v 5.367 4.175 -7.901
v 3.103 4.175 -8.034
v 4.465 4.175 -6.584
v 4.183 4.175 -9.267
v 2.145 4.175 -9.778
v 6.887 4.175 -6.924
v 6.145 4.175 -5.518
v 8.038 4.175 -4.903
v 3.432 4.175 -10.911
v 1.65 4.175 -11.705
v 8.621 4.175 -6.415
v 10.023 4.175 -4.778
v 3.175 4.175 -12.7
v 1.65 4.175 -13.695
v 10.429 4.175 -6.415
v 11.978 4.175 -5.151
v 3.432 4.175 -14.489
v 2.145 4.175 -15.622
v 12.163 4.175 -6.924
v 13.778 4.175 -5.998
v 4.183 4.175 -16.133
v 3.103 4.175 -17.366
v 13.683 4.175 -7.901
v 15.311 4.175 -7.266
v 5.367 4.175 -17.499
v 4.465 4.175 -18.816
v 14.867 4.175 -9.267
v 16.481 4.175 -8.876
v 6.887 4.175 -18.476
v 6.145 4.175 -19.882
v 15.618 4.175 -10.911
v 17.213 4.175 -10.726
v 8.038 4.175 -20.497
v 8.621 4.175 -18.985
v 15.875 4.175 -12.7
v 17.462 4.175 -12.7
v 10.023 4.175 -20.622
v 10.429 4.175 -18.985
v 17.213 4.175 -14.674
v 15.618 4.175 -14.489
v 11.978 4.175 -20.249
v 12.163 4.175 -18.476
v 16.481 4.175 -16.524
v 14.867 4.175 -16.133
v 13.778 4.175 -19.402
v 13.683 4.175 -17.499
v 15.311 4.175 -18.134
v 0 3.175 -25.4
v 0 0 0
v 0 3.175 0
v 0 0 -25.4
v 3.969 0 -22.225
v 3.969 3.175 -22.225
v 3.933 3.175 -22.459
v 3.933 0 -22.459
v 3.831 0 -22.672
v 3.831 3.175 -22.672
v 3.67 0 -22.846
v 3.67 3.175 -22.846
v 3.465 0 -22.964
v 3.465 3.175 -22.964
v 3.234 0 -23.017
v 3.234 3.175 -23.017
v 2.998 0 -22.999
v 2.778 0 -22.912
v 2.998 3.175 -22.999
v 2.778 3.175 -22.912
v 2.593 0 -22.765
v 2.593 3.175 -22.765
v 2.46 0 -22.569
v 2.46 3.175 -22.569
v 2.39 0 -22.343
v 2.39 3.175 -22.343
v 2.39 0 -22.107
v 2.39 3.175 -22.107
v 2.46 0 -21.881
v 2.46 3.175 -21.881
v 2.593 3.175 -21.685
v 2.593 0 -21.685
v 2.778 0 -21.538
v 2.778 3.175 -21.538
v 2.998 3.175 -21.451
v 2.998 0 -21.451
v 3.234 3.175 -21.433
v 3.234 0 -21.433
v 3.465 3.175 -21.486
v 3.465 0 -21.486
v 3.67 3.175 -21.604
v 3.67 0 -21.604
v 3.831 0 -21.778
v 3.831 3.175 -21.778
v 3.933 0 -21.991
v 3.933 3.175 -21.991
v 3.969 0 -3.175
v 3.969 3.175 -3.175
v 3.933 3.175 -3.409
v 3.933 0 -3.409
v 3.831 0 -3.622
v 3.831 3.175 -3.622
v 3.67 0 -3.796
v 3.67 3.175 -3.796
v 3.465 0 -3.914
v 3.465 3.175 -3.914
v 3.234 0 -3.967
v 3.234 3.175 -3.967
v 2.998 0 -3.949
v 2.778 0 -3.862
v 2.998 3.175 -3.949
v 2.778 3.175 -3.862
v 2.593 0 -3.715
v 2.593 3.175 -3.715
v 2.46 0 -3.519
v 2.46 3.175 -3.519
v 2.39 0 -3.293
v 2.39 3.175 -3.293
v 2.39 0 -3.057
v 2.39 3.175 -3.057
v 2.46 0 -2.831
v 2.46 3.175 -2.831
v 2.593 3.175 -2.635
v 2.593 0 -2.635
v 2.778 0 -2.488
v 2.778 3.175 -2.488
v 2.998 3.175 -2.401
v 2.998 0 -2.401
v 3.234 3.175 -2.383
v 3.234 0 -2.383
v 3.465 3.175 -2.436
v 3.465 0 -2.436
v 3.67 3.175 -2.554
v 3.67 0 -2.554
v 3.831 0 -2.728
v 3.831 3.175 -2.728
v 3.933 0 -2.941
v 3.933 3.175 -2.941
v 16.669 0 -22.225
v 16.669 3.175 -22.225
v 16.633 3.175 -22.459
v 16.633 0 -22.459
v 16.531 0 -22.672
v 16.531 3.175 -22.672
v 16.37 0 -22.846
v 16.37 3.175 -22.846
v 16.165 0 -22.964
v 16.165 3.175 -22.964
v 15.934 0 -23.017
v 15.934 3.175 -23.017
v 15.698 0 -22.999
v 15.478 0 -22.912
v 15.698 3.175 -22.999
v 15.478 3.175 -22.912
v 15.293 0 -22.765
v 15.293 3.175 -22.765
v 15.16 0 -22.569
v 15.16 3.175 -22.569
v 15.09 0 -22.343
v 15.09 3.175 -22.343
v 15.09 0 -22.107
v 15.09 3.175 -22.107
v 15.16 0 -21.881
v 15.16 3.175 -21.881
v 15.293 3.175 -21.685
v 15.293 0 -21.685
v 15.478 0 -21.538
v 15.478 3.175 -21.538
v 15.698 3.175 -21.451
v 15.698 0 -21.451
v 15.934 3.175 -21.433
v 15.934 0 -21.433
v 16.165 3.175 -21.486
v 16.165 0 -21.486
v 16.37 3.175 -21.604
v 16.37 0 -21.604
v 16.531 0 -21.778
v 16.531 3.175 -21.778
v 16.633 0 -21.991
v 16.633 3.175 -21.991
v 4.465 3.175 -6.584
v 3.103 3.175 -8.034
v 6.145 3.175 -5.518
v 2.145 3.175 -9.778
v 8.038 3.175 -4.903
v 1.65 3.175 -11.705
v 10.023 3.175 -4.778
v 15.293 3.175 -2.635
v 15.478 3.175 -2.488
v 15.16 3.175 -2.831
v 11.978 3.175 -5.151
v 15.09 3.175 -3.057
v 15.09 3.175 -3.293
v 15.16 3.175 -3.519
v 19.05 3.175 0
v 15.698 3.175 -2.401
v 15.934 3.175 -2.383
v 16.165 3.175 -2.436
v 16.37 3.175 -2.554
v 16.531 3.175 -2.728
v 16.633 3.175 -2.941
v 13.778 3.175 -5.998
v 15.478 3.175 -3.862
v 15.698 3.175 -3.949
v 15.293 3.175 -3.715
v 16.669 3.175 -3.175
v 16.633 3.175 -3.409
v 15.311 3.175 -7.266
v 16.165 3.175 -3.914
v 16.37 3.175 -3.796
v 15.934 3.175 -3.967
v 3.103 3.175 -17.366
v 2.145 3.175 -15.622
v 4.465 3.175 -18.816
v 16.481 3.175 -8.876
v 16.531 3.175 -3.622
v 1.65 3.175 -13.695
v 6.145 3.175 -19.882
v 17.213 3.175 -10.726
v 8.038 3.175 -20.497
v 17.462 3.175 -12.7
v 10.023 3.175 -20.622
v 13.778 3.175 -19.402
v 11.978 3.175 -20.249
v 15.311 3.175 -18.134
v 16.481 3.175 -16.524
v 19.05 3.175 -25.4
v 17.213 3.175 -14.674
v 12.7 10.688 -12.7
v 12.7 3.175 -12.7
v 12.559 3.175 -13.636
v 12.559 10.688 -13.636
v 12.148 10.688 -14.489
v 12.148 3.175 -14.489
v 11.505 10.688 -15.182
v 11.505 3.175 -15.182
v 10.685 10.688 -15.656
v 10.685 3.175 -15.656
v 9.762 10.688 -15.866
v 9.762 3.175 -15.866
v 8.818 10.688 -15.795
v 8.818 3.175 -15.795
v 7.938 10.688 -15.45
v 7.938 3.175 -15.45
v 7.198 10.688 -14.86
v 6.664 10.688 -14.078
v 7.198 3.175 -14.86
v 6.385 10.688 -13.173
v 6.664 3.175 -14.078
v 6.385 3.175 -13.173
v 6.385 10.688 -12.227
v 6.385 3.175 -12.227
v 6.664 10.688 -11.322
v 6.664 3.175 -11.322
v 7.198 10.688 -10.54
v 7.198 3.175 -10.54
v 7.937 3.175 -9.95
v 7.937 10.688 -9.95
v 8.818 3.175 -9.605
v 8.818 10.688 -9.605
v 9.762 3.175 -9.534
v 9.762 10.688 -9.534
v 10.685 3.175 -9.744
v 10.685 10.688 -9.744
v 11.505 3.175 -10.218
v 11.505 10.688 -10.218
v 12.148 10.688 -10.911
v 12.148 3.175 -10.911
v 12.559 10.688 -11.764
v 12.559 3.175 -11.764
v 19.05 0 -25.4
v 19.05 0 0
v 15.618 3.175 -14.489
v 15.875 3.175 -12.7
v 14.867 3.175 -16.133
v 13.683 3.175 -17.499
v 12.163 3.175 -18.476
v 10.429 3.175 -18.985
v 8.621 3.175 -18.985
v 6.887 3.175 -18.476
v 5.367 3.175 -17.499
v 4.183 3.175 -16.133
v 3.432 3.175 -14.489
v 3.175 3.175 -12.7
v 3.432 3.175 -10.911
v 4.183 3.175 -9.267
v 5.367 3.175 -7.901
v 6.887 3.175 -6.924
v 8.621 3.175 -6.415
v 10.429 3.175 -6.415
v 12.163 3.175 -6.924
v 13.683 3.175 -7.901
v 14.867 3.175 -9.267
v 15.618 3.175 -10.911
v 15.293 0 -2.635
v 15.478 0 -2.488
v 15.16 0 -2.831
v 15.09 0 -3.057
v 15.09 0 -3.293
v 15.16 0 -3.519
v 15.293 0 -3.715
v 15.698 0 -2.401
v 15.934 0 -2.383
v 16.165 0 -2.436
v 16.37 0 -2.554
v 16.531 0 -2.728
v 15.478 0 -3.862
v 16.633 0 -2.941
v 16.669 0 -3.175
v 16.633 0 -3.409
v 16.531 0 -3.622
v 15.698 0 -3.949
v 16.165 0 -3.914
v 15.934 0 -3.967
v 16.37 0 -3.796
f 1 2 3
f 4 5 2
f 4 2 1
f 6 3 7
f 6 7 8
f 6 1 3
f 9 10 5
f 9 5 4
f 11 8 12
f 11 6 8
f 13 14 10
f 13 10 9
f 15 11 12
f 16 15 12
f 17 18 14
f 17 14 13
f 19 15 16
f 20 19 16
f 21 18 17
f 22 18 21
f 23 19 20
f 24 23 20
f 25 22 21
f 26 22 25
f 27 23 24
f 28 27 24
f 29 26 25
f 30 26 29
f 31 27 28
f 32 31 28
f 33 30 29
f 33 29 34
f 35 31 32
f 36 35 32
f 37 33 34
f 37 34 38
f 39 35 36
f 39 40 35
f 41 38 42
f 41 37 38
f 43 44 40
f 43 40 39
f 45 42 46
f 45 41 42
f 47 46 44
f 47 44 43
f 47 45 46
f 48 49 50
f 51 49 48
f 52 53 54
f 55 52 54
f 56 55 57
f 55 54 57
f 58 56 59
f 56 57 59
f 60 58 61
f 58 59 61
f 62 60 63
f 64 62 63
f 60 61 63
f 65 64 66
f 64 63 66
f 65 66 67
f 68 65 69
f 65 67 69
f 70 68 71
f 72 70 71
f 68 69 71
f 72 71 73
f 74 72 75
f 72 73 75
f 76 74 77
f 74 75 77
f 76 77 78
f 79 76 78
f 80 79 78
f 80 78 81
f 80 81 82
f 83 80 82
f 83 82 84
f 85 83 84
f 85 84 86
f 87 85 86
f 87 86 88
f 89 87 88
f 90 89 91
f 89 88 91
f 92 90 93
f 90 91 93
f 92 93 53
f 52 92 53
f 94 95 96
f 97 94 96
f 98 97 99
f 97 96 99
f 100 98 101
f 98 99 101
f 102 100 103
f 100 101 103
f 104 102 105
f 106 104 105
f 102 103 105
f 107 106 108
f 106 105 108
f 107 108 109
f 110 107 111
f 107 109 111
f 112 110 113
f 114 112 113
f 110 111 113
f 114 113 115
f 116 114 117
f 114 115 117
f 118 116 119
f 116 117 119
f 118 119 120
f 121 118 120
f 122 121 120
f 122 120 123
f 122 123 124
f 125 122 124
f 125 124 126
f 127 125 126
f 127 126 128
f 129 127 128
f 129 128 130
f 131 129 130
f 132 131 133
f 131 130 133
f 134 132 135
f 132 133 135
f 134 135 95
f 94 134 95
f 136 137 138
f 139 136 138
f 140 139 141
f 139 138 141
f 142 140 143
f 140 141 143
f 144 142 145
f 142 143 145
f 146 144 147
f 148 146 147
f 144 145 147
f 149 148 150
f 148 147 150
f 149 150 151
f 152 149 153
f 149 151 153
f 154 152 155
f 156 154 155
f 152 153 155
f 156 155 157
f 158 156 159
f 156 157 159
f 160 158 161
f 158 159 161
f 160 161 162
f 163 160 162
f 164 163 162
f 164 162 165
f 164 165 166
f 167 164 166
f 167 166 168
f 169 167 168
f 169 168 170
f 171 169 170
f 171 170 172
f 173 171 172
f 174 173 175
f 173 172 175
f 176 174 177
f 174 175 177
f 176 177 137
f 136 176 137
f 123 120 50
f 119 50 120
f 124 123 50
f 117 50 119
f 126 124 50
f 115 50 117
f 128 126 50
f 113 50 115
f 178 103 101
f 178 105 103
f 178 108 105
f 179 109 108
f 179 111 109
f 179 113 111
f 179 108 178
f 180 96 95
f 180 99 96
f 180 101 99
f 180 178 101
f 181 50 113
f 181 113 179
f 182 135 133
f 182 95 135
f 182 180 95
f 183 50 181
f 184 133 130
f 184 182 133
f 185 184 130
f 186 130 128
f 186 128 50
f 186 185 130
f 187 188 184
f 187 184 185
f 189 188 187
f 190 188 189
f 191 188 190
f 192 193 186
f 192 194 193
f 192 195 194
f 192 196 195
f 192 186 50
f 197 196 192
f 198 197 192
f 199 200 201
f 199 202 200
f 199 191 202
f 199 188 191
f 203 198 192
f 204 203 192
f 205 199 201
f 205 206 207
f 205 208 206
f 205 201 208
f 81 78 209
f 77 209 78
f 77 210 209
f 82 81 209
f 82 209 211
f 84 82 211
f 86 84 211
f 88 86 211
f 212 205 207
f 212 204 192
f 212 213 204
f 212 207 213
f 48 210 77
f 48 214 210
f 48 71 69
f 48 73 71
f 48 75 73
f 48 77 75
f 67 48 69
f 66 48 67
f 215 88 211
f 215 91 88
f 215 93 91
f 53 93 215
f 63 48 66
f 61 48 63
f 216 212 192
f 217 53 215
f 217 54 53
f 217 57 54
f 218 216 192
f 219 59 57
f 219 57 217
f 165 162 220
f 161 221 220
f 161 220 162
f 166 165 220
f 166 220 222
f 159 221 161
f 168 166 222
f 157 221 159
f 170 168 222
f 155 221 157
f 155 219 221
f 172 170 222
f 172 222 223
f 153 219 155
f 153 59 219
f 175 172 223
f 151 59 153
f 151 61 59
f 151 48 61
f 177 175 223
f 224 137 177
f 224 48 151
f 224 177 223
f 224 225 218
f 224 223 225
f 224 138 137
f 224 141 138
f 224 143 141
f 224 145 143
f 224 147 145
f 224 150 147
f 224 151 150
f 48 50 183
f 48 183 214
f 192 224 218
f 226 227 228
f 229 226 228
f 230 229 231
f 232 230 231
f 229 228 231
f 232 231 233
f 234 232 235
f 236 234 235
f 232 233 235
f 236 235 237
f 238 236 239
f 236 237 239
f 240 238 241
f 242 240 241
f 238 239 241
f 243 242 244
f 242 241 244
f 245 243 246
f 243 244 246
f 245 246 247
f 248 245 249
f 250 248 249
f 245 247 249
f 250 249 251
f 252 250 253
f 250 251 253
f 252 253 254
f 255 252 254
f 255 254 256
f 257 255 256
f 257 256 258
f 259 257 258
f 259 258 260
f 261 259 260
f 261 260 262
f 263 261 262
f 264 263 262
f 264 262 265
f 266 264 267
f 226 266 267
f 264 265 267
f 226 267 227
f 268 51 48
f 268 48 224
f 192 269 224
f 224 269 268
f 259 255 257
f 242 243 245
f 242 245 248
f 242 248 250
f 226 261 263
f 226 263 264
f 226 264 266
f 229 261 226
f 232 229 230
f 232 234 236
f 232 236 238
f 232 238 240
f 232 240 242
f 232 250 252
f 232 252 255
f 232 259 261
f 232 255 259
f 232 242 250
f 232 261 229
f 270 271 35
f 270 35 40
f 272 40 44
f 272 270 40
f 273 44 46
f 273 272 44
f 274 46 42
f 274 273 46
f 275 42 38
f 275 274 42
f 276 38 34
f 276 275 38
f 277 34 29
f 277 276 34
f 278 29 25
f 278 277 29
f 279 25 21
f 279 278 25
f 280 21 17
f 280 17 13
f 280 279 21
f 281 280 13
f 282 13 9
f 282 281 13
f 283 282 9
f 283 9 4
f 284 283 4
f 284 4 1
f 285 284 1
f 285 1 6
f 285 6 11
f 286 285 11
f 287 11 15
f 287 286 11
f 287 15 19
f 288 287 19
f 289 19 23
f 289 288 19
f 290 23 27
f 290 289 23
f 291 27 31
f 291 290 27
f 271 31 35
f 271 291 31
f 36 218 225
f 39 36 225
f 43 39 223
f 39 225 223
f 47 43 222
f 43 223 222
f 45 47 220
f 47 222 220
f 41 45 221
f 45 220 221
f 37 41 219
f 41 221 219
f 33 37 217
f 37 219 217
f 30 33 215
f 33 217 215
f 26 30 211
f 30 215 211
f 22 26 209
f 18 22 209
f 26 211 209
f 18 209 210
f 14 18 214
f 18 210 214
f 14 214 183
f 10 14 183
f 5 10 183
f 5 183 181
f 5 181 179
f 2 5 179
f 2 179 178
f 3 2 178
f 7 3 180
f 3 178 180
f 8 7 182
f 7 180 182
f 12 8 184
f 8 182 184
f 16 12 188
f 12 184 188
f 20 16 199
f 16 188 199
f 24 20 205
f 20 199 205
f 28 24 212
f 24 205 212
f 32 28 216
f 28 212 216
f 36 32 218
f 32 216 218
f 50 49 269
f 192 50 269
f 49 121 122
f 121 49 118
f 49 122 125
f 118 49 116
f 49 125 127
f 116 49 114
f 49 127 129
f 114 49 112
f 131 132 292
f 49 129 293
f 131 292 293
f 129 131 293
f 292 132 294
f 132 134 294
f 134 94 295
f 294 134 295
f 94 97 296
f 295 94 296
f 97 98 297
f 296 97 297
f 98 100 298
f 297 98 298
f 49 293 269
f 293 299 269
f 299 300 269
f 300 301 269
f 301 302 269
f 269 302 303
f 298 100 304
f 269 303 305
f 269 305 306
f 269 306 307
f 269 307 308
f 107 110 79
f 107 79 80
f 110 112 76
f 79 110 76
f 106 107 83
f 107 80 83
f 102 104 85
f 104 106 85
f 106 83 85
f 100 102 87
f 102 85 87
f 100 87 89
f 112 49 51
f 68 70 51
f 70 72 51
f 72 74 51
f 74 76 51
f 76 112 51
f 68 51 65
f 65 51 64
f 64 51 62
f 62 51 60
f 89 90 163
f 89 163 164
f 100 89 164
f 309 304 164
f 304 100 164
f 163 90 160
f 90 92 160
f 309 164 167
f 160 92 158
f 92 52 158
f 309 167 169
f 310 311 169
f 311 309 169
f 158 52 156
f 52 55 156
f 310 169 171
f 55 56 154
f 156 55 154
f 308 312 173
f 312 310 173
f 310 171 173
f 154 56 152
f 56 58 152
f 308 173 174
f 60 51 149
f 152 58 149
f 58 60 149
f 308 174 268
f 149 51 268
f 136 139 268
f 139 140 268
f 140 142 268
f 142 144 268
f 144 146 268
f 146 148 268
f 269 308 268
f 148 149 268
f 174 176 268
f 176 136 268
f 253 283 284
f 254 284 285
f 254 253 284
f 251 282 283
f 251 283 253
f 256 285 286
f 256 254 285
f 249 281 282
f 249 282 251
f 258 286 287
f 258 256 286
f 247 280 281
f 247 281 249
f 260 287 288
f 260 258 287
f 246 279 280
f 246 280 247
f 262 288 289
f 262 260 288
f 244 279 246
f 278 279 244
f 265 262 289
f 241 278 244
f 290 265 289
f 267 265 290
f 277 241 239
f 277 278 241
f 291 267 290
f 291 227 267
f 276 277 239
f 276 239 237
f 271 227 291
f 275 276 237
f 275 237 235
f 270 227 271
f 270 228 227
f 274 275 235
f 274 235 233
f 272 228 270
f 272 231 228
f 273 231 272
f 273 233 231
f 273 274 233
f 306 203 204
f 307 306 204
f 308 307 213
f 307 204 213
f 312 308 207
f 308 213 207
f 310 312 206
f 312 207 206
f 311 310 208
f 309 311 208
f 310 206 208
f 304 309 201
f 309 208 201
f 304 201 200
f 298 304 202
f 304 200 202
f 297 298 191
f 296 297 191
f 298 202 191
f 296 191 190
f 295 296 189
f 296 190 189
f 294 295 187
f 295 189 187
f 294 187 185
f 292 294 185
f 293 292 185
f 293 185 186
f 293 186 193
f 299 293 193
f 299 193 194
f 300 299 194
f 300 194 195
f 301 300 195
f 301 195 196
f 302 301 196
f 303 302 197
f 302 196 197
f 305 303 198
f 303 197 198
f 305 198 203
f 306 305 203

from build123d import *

# Parameters (mm, degrees)
SKETCH1_W           = 19.05
SKETCH1_H           = 25.4
BOSS_EXTRUDE1_DEPTH = 3.175
SKETCH2_R           = 3.175
BOSS_EXTRUDE2_DEPTH = 7.5125
SKETCH3_R           = 0.79375
CUT_EXTRUDE1_DEPTH  = 3.175
SKETCH4_R           = 7.9375
SKETCH4_R_2         = 6.35
BOSS_EXTRUDE3_DEPTH = 1


with BuildPart() as part:
    # Sketch1 → Boss-Extrude1 (new body)
    with BuildSketch(Plane(origin=(0, 0, 0), x_dir=(1, 0, 0), z_dir=(0, 1, 0))):
        with Locations((9.525, 12.7)):
            Rectangle(SKETCH1_W, SKETCH1_H)
    extrude(amount=BOSS_EXTRUDE1_DEPTH)

    # Sketch2 → Boss-Extrude2 (add)
    with BuildSketch(Plane(origin=(0, 3.175, 0), x_dir=(1, 0, 0), z_dir=(0, 1, 0))):
        with Locations((9.525, 12.7)):
            Circle(SKETCH2_R)
    extrude(amount=BOSS_EXTRUDE2_DEPTH)

    # Sketch3 → Cut-Extrude1 (cut)
    with BuildSketch(Plane(origin=(0, 3.175, 0), x_dir=(1, 0, 0), z_dir=(0, 1, 0))):
        with Locations((3.175, 22.225)):
            Circle(SKETCH3_R)
        with Locations((15.875, 22.225)):
            Circle(SKETCH3_R)
        with Locations((15.875, 3.175)):
            Circle(SKETCH3_R)
        with Locations((3.175, 3.175)):
            Circle(SKETCH3_R)
    extrude(amount=-CUT_EXTRUDE1_DEPTH, mode=Mode.SUBTRACT)

    # Sketch4 → Boss-Extrude3 (add)
    with BuildSketch(Plane(origin=(0, 3.175, 0), x_dir=(1, 0, 0), z_dir=(0, 1, 0))):
        with Locations((9.525, 12.7)):
            Circle(SKETCH4_R)
        with Locations((9.525, 12.7)):
            Circle(SKETCH4_R_2, mode=Mode.SUBTRACT)
    extrude(amount=BOSS_EXTRUDE3_DEPTH)


solid = part.part
